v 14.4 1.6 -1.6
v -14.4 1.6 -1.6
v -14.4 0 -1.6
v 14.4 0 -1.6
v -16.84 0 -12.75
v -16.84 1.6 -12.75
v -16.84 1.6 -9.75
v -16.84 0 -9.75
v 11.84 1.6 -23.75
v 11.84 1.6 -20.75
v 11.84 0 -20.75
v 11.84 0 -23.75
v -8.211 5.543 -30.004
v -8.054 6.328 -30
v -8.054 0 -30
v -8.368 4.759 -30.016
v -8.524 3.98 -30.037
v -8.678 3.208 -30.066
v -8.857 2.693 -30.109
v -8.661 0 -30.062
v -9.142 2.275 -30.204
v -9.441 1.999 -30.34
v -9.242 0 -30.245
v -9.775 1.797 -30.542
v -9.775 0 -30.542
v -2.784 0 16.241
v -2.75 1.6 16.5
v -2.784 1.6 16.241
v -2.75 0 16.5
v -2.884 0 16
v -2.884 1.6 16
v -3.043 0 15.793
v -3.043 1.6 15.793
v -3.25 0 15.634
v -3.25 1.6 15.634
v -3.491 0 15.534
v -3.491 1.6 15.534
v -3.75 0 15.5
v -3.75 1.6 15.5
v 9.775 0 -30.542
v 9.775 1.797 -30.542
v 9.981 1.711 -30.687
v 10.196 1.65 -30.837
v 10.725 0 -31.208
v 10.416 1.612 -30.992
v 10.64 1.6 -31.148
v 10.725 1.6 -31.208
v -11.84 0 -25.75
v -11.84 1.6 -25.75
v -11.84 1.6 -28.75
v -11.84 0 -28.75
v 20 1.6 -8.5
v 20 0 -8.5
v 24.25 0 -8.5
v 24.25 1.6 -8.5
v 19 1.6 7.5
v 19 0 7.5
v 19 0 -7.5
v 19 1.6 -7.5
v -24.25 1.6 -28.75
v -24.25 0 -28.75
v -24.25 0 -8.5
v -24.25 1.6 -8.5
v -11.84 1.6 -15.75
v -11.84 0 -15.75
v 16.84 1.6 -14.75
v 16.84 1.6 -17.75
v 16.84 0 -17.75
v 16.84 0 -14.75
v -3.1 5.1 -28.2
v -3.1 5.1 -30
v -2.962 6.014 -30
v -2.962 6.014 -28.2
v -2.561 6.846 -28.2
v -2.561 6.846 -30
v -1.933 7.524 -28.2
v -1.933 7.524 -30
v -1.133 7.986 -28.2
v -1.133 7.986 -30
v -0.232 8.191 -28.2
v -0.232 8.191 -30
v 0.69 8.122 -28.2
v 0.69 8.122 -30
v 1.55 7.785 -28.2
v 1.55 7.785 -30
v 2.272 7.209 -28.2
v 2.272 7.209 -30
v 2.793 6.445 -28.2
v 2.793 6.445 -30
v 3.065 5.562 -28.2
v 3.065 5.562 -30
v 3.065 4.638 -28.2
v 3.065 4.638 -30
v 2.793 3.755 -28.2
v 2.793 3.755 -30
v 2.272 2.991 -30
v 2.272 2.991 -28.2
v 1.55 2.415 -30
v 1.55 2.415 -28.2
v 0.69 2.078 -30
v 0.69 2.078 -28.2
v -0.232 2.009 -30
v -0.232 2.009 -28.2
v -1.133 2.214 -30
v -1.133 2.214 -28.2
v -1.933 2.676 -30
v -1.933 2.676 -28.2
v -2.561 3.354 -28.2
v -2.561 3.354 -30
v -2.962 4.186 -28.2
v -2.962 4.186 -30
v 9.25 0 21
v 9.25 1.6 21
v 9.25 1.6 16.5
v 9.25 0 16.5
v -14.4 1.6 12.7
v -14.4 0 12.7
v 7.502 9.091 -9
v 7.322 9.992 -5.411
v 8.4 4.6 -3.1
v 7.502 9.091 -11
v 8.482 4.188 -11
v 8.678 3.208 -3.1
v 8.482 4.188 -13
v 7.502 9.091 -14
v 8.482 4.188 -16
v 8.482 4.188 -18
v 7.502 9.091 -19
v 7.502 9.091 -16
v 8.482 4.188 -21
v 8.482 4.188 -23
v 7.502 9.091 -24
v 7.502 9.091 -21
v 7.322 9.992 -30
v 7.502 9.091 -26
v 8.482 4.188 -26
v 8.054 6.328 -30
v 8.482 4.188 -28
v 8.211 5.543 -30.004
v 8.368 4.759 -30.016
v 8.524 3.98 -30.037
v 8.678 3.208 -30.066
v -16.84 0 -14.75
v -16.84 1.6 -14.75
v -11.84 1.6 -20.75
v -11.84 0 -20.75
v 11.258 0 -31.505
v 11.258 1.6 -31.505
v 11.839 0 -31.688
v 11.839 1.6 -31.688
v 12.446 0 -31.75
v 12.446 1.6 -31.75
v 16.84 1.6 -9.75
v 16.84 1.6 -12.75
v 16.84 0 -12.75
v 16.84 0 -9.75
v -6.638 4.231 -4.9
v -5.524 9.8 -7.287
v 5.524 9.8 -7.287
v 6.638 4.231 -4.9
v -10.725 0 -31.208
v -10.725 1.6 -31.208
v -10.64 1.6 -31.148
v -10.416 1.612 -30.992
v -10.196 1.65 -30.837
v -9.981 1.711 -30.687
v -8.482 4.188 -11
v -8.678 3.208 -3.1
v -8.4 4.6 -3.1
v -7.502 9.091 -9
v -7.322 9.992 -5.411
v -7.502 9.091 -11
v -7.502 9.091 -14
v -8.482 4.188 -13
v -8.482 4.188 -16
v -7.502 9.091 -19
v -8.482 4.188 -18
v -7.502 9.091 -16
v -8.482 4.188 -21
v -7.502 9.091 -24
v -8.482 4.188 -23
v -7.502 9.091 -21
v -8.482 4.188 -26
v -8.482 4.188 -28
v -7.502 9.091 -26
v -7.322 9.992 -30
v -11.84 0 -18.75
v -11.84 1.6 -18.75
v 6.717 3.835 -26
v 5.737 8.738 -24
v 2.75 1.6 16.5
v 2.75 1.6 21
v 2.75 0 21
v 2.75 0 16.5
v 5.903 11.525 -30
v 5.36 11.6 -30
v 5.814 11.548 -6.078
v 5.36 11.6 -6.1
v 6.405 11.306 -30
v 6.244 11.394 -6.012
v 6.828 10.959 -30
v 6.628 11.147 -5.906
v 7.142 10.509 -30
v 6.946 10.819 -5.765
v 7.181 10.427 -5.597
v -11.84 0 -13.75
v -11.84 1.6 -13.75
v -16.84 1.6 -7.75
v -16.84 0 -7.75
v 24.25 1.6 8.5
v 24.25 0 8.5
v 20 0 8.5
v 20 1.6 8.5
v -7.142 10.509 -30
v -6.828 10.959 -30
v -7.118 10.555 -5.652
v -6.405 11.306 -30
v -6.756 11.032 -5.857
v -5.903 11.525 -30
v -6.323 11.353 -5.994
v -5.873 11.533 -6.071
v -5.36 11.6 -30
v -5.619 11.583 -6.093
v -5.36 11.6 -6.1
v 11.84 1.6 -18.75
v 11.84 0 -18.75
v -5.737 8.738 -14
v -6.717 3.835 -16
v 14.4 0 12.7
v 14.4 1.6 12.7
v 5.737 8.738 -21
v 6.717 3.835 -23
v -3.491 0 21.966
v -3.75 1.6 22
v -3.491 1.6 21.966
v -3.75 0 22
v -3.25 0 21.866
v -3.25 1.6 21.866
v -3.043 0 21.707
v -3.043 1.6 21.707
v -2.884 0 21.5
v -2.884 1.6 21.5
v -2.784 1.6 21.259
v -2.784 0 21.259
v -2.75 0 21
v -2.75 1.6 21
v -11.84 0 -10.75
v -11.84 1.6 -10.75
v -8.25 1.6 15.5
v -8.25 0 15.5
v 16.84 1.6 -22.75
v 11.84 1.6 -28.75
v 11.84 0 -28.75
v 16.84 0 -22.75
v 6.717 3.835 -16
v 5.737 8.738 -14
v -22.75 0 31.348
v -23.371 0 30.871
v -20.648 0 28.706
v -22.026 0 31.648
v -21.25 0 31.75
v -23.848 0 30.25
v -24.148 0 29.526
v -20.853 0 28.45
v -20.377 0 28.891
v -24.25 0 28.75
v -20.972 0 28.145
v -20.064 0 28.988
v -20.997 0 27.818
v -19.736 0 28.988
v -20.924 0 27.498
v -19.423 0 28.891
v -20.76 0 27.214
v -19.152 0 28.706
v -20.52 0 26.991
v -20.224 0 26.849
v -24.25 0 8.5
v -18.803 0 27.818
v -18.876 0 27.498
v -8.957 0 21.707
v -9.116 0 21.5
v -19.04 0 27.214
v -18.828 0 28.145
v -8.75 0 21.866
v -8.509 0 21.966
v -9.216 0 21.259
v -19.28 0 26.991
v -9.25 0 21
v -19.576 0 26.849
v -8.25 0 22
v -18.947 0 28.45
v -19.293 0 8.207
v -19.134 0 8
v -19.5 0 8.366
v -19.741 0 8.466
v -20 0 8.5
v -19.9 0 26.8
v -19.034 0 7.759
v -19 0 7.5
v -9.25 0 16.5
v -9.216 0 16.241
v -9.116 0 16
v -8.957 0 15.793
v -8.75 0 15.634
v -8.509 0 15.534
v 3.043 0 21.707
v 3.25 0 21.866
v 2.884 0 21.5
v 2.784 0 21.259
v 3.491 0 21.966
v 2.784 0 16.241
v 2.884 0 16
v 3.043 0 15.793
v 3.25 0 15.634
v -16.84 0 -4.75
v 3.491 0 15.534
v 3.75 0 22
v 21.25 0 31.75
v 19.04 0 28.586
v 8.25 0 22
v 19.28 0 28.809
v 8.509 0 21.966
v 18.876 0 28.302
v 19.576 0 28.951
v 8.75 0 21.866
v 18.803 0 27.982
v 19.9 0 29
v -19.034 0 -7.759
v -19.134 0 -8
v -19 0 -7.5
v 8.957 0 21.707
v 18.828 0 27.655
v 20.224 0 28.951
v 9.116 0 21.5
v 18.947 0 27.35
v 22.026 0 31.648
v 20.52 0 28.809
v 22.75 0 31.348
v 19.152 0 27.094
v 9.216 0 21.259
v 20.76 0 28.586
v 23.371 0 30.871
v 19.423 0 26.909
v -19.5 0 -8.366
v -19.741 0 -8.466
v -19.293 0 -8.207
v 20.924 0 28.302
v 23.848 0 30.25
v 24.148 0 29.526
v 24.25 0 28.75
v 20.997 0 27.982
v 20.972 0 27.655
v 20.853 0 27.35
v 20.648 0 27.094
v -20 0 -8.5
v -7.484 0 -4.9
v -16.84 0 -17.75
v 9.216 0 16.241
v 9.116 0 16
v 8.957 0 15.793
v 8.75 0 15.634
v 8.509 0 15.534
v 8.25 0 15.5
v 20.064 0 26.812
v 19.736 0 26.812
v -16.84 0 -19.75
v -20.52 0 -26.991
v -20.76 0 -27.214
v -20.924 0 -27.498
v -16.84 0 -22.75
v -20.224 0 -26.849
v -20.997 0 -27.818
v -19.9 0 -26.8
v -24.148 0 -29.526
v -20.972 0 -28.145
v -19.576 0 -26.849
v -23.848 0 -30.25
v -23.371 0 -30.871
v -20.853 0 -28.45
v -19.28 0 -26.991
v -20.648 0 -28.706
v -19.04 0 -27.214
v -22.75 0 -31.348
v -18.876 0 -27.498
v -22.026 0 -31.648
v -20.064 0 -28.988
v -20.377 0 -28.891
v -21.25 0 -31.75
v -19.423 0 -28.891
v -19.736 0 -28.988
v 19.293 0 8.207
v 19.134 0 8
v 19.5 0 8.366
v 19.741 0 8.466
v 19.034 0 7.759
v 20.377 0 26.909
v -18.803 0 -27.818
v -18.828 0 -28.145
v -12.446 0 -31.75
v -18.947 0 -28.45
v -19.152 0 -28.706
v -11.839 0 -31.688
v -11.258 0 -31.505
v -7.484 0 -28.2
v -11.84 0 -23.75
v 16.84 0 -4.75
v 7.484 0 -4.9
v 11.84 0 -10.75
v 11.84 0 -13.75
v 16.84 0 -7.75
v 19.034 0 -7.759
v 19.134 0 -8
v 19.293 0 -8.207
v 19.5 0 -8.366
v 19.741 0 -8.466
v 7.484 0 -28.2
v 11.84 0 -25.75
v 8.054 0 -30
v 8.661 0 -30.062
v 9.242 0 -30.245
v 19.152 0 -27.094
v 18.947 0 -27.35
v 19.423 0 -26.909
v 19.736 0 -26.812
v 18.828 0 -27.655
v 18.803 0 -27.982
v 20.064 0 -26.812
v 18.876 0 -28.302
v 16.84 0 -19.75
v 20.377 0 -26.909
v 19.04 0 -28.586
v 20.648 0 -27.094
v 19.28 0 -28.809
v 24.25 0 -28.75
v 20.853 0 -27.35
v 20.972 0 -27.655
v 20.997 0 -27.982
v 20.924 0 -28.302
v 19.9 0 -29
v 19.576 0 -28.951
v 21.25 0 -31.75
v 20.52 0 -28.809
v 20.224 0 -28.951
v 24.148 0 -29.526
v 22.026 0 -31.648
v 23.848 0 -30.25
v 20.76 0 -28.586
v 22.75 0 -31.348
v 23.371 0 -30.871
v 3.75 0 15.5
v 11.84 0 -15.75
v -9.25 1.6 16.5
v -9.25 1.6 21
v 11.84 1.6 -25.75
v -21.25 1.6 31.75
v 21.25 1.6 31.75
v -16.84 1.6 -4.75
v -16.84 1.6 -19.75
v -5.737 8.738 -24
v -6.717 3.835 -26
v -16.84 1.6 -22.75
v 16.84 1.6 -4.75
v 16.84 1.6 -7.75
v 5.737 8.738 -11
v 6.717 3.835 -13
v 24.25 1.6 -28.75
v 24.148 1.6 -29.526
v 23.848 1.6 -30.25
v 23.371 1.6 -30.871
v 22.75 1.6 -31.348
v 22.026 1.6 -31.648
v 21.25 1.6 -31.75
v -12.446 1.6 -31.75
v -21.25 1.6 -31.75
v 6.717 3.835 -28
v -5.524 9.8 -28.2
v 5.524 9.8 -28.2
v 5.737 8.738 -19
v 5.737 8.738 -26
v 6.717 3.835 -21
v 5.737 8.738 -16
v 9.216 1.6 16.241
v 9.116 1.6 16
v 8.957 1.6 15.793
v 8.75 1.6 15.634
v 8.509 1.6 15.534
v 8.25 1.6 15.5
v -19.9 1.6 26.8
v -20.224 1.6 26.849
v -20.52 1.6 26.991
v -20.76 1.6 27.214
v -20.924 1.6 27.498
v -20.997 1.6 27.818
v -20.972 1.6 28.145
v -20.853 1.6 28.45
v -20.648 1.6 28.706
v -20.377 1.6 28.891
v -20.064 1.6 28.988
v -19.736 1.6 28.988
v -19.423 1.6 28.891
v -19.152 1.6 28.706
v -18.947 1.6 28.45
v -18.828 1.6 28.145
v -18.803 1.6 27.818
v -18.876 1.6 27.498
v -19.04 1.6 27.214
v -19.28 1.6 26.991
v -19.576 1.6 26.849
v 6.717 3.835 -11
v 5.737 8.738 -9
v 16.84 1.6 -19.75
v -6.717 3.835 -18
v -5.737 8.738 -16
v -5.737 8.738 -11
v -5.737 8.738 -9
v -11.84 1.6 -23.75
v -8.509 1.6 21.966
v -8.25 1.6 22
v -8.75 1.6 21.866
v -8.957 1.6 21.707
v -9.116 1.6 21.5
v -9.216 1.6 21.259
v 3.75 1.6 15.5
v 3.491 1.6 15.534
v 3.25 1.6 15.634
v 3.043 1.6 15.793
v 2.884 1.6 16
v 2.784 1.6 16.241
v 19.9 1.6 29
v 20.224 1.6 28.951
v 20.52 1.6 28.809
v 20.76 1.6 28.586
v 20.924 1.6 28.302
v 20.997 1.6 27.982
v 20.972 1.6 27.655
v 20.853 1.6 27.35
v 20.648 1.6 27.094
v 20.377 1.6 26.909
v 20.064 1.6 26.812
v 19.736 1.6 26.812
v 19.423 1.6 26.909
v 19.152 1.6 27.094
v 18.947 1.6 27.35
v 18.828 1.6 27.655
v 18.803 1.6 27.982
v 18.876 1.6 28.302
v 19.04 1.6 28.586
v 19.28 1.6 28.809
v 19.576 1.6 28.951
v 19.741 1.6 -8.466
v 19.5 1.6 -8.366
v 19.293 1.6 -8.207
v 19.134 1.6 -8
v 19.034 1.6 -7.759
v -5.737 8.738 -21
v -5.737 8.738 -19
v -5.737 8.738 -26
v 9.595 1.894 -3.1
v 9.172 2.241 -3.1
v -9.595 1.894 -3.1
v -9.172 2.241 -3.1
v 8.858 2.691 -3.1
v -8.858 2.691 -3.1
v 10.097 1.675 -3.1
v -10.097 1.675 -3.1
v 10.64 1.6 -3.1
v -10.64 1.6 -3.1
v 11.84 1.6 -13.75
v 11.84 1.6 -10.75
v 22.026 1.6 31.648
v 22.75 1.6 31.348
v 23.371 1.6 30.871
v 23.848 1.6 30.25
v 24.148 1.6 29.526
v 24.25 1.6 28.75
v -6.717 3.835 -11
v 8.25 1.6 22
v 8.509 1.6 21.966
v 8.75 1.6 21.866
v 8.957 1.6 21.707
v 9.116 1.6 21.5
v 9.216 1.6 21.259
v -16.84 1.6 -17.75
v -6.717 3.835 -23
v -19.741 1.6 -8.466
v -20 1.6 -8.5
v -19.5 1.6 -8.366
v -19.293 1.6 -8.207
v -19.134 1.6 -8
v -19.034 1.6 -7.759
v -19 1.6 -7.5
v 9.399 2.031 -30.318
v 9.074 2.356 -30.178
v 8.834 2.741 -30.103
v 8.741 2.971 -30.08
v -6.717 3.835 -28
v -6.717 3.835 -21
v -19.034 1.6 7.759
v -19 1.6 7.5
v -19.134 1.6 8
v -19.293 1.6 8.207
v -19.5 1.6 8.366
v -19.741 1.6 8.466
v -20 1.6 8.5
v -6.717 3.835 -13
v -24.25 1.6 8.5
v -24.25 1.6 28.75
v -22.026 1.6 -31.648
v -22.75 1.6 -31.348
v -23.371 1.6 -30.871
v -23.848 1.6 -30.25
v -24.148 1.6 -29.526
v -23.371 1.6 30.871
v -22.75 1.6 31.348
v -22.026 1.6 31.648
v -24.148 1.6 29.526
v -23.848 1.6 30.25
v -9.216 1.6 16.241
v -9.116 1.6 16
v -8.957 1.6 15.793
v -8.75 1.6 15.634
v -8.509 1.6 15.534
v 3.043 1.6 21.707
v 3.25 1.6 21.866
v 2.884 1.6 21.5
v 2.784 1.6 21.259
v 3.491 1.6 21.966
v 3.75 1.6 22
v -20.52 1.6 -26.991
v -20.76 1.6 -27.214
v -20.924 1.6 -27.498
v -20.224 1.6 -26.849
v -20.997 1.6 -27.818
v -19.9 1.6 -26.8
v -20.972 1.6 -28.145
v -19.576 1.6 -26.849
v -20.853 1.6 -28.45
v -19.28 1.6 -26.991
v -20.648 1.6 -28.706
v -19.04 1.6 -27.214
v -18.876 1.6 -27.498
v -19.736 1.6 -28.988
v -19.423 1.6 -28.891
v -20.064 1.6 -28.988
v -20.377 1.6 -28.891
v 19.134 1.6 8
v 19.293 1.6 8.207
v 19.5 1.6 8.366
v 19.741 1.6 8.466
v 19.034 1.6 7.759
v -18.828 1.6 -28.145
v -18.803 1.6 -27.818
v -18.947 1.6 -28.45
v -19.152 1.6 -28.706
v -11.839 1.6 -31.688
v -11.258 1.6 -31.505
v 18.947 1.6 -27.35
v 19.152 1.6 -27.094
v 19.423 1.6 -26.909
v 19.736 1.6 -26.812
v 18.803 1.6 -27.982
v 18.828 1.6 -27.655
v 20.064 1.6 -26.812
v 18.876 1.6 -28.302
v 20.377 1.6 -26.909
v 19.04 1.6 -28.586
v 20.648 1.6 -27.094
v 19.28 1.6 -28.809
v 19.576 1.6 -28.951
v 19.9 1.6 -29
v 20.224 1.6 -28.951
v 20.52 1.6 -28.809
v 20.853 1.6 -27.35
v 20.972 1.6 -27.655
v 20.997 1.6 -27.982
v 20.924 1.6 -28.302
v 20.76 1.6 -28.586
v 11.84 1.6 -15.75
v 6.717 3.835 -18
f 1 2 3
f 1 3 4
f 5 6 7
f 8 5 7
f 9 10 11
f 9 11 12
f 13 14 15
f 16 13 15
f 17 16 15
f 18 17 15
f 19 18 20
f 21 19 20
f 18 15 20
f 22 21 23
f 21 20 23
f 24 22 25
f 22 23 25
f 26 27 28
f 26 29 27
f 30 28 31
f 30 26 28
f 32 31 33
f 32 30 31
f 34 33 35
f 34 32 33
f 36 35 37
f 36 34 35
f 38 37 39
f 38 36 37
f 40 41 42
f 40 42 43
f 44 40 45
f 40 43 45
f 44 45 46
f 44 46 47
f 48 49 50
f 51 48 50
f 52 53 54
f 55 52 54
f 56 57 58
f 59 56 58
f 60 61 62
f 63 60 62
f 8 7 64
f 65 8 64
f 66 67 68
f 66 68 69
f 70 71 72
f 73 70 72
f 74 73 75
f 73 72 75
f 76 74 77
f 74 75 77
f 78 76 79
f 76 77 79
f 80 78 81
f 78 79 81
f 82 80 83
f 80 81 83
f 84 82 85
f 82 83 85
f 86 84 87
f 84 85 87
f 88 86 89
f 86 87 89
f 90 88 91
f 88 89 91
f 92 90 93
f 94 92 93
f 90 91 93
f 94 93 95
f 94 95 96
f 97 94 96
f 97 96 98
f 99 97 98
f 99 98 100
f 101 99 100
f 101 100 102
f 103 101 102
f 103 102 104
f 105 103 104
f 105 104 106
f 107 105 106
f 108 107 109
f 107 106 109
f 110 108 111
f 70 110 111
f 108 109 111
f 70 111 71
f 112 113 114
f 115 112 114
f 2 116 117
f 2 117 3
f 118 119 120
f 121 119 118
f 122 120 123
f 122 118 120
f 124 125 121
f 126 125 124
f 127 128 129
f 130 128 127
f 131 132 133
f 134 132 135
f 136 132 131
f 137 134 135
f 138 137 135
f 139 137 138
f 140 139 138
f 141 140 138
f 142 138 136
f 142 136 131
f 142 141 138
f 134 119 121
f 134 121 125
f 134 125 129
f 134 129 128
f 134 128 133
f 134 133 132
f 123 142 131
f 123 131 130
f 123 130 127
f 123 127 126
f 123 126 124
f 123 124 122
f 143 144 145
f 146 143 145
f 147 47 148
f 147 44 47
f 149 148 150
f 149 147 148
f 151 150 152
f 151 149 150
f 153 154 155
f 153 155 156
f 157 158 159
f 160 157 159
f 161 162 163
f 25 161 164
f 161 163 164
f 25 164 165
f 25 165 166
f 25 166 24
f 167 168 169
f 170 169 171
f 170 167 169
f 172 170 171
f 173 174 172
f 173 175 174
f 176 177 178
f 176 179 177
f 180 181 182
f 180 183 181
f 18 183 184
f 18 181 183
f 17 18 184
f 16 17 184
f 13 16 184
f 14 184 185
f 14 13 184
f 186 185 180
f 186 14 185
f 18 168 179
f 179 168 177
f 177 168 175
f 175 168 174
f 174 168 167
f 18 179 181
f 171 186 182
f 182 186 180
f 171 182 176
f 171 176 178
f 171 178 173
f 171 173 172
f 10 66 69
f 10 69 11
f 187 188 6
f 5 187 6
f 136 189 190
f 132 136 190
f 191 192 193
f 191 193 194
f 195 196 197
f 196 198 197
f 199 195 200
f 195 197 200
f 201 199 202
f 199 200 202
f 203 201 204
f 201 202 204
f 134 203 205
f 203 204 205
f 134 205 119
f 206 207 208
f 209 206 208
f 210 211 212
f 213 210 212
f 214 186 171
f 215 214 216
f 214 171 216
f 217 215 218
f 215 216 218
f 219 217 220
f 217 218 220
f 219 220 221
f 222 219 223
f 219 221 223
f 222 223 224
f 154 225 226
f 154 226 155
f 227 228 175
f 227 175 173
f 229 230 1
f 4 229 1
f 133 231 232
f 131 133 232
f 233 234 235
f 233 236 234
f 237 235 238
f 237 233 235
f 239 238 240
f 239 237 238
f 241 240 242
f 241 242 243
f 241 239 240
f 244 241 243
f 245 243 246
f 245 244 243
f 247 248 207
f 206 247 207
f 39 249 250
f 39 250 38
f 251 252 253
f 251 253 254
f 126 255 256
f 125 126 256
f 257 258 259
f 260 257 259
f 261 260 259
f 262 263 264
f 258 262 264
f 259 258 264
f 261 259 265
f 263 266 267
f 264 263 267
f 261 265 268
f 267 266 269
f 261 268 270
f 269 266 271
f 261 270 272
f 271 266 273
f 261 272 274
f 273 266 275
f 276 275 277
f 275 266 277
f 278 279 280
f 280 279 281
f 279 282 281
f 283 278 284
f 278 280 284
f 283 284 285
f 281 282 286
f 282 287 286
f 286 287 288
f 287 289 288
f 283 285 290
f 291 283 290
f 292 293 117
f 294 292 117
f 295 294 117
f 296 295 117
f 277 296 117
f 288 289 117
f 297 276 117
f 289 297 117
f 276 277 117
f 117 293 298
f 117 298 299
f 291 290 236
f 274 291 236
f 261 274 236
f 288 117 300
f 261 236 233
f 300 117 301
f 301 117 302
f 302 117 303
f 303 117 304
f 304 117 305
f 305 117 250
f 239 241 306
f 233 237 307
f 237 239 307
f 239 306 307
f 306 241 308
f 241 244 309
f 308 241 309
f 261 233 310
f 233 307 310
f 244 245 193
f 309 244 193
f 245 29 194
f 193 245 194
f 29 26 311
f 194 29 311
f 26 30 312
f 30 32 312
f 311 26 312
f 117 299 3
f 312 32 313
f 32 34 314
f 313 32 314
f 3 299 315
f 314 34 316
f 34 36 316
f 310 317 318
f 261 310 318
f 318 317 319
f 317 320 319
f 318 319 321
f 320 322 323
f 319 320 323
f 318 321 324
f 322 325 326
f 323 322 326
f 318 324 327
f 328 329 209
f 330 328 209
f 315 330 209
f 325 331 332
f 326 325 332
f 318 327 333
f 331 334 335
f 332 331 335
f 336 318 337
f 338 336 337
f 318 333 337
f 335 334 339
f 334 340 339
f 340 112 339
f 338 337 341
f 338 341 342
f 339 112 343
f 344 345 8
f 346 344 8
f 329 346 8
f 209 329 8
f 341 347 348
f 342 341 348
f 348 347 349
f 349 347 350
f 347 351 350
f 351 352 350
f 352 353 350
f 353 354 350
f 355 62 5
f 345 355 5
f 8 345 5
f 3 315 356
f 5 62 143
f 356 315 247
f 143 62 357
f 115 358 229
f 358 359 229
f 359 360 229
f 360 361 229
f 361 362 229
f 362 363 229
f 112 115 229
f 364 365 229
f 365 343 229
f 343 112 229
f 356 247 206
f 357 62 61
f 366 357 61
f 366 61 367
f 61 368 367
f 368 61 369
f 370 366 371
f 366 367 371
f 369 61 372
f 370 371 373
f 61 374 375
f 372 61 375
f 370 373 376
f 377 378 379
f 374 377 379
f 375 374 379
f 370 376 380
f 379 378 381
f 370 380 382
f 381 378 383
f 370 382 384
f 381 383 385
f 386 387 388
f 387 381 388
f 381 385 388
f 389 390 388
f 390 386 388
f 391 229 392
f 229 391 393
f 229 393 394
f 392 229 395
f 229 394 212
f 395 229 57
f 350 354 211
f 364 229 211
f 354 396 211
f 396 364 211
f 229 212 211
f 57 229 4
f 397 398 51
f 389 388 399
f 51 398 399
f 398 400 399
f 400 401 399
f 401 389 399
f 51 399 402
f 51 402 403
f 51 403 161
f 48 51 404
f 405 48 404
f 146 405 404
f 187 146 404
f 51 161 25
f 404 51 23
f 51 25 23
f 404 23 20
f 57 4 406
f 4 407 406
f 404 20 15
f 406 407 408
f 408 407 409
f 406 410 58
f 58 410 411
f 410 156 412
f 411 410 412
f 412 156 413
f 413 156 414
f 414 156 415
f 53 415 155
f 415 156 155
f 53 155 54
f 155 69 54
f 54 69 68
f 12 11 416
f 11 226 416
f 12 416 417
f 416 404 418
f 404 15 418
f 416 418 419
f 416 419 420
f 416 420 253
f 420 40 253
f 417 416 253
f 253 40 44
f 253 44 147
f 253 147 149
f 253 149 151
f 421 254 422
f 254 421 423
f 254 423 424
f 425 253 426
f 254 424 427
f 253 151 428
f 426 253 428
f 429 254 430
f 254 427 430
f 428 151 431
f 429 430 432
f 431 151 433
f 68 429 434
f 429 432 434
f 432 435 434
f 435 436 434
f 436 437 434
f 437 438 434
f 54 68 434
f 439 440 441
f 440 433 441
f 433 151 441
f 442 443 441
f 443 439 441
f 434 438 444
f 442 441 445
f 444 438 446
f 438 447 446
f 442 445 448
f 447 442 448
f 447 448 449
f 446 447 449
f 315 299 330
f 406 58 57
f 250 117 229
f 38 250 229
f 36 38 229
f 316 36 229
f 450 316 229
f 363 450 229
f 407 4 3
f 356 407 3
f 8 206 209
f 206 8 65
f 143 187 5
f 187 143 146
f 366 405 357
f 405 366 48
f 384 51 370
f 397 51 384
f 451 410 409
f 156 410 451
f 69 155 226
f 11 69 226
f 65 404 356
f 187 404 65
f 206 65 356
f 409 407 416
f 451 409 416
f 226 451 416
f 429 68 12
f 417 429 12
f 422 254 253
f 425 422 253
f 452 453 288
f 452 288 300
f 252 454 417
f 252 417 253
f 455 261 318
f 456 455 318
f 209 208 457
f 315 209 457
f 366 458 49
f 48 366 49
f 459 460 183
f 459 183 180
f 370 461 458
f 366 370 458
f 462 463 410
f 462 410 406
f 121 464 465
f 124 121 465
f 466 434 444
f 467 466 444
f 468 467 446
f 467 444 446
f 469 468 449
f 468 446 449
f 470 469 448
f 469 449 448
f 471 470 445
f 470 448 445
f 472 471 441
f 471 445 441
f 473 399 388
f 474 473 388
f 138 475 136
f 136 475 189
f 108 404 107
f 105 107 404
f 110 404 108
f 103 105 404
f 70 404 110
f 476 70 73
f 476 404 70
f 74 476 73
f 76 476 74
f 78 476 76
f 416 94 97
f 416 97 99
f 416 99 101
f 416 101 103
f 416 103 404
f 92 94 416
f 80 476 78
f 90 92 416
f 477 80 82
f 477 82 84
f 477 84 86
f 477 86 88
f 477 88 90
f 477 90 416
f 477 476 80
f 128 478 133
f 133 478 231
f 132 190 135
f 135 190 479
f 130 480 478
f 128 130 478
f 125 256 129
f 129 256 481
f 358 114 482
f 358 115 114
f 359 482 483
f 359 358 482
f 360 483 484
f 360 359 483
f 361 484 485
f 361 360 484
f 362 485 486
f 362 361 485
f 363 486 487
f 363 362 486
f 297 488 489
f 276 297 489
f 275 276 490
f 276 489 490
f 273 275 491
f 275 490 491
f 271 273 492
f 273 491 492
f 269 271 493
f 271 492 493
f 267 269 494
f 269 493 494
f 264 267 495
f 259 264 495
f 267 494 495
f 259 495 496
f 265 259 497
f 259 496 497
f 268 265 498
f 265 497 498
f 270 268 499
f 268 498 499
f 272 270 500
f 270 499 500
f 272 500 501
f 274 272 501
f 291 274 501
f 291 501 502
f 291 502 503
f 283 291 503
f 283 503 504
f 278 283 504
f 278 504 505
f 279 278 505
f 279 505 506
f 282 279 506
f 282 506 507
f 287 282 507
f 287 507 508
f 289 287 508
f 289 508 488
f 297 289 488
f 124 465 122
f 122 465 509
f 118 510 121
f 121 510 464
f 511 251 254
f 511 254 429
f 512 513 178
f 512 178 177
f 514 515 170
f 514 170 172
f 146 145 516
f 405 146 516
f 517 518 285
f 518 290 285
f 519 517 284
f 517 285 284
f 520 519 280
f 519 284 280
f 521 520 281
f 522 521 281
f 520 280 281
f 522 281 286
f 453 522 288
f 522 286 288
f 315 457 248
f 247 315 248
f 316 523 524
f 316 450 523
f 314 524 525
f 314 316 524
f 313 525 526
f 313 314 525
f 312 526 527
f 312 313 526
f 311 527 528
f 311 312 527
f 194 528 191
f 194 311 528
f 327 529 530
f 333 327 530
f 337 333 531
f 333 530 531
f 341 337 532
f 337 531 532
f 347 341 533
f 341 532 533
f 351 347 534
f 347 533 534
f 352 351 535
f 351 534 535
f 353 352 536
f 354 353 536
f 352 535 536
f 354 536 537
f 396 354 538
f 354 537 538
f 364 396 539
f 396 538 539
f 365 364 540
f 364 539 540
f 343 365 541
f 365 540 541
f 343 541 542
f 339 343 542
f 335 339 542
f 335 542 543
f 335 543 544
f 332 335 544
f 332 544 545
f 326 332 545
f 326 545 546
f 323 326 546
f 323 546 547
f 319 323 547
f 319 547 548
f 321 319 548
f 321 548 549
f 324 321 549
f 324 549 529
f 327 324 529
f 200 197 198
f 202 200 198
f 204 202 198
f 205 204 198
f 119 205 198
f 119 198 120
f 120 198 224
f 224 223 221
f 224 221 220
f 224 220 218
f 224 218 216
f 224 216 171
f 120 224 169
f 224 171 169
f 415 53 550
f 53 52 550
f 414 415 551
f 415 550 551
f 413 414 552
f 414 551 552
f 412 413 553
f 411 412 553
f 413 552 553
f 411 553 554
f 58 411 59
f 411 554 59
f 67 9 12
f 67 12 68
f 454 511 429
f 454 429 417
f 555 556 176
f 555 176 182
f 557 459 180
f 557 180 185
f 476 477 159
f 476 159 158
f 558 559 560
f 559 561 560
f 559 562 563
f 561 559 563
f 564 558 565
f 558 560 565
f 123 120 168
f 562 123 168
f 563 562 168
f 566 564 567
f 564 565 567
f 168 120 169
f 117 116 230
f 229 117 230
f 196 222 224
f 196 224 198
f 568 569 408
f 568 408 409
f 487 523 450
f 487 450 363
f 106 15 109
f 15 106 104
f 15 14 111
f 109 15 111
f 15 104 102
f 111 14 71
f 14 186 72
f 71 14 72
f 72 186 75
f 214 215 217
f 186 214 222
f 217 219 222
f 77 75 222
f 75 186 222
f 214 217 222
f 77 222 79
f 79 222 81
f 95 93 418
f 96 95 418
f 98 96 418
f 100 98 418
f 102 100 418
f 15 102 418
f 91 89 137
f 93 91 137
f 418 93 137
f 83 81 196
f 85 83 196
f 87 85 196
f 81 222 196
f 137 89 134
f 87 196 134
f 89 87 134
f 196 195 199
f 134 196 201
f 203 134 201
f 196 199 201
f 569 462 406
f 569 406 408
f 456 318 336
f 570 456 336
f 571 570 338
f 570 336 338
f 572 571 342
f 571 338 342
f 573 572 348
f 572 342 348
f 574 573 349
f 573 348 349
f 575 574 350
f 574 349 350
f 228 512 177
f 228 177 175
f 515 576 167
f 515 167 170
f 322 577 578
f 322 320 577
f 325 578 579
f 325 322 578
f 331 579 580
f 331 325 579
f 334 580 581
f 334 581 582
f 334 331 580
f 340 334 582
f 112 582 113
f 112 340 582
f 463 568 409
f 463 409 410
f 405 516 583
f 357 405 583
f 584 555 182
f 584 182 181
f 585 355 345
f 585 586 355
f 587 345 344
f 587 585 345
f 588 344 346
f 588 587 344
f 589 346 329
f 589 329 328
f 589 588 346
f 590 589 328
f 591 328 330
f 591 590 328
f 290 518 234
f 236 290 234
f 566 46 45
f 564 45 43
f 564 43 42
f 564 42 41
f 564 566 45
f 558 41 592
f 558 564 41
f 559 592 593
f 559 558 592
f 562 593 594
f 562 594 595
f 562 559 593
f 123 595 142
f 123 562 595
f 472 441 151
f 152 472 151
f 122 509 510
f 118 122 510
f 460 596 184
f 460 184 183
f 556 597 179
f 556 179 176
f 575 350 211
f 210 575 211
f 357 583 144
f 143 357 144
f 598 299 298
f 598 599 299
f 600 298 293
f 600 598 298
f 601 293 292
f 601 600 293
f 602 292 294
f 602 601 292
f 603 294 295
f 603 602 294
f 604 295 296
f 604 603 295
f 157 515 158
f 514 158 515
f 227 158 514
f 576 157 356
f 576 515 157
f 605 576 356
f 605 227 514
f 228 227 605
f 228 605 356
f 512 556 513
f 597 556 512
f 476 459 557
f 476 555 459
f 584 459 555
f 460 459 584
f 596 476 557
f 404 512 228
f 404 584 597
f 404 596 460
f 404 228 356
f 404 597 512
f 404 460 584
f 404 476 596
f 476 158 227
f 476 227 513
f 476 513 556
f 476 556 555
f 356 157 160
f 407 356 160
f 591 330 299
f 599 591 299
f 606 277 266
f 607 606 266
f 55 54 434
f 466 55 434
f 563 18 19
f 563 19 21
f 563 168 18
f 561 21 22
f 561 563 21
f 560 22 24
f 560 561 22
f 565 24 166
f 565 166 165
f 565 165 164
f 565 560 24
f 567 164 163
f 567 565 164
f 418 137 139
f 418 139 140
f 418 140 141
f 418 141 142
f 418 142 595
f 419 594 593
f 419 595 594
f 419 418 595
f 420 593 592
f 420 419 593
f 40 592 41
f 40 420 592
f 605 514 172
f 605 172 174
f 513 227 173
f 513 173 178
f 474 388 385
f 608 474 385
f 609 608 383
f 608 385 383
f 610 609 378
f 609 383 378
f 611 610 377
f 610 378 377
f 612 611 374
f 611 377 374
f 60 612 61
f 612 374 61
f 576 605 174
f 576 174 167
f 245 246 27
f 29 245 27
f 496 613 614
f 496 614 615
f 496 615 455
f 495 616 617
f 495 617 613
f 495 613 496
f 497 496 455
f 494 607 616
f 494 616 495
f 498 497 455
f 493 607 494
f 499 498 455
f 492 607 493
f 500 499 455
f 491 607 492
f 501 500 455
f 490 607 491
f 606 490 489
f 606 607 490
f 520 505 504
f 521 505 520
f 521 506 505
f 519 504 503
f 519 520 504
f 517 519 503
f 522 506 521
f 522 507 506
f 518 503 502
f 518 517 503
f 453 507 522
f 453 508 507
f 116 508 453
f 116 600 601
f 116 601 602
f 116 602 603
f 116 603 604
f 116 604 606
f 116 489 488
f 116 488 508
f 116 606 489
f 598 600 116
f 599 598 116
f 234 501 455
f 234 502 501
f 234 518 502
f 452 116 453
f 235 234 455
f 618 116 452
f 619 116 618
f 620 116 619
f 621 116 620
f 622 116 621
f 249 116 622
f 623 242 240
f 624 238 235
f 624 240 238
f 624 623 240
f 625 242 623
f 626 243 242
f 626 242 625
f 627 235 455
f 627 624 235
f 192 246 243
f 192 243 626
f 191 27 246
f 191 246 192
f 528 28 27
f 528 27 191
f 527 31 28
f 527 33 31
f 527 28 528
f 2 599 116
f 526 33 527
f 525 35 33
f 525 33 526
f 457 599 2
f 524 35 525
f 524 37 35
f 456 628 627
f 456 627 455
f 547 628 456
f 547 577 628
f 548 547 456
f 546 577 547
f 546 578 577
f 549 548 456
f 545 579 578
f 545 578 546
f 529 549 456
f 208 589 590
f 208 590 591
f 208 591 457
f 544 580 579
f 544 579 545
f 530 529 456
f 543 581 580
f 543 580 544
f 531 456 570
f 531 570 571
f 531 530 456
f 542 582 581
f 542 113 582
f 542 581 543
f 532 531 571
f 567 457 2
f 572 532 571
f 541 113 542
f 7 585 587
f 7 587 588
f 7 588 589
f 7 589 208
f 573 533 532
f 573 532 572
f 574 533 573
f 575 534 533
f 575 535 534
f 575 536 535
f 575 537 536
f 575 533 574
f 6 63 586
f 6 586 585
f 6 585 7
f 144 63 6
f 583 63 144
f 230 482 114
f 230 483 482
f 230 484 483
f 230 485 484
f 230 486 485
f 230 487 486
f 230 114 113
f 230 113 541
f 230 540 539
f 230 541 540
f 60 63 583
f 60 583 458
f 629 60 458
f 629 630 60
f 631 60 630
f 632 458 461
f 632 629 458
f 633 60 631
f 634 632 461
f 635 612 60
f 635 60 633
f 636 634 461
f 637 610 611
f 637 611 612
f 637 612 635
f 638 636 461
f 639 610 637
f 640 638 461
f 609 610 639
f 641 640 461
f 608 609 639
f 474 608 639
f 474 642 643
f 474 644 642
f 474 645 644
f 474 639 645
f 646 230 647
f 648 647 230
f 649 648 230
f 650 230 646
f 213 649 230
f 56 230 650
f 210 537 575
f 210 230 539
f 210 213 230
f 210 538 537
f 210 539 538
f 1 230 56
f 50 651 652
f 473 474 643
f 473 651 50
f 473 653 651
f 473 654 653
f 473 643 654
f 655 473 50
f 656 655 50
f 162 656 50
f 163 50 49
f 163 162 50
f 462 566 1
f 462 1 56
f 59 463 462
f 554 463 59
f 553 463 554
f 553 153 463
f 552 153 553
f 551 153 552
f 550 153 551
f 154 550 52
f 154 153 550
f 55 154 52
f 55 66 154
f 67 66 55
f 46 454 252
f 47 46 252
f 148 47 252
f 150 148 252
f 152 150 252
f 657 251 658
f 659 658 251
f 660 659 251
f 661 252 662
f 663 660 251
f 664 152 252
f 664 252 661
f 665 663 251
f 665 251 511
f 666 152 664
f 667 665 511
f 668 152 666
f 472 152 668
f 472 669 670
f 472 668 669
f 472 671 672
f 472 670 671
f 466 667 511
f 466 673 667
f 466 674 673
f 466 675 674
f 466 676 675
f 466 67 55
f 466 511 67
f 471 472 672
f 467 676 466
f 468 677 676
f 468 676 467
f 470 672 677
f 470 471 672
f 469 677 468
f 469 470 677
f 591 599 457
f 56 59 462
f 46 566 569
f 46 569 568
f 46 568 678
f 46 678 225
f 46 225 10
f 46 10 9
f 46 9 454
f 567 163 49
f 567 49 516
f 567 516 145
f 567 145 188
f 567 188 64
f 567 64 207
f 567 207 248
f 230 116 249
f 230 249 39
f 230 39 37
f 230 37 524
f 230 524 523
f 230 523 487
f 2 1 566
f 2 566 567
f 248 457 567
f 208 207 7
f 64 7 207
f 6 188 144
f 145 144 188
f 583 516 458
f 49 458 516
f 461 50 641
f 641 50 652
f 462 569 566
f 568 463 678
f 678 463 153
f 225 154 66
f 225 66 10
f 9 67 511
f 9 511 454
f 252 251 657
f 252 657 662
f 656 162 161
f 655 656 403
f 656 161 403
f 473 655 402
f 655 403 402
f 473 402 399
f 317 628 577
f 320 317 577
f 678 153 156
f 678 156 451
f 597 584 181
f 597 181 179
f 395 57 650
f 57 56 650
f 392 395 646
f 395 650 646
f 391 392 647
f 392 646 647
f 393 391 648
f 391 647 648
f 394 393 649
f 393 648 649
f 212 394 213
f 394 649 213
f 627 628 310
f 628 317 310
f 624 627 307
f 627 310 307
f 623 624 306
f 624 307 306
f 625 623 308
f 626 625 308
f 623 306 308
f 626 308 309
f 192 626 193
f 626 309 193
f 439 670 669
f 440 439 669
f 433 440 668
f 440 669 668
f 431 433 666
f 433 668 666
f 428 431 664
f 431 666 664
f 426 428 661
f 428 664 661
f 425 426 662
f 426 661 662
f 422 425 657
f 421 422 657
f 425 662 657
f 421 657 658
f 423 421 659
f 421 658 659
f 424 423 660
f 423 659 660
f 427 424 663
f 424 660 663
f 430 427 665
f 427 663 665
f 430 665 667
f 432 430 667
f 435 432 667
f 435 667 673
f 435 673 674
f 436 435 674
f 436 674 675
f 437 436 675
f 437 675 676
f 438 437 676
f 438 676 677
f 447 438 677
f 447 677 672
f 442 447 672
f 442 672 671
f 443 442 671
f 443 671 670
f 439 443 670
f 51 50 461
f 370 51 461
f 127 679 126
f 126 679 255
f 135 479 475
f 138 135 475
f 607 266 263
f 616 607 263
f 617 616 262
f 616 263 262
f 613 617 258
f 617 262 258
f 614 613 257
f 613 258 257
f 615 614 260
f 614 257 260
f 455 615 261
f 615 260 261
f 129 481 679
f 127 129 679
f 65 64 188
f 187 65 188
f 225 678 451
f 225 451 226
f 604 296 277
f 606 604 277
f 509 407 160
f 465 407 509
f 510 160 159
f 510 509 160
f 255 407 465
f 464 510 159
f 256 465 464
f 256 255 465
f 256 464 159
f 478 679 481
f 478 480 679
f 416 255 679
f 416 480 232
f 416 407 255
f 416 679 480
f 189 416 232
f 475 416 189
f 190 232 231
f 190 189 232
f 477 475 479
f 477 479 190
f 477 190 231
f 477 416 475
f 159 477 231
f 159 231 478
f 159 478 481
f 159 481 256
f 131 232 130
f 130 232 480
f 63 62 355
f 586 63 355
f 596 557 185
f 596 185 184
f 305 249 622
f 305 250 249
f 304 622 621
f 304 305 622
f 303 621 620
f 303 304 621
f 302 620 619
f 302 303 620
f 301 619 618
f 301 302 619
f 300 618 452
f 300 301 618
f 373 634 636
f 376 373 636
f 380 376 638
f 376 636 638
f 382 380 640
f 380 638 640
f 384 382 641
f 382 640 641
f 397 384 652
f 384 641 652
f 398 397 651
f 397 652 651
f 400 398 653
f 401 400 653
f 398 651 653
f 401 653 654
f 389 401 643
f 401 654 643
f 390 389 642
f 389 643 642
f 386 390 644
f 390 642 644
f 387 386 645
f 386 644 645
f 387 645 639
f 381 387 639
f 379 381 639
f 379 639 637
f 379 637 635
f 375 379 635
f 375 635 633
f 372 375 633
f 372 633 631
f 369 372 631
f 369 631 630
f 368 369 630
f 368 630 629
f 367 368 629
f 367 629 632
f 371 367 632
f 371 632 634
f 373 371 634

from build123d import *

# Parameters (mm, degrees)
EXTRUDE_1_DEPTH          = 1.6
SKETCH_2_R               = 1.1
CUT_EXTRUDE_1_DEPTH      = 40.983559121
FILLET_1_R               = 1
SKETCH_4_W               = 6.5
SKETCH_4_H               = 6.5
CUT_EXTRUDE_2_DEPTH      = 40.983559121
FILLET_2_R               = 1
SKETCH_8_W               = 28.8
SKETCH_8_H               = 14.3
CUT_EXTRUDE_3_DEPTH      = 1.6
EXTRUDE_START            = -1.75
EXTRUDE_2_DEPTH          = 26.9
CUT_EXTRUDE_4_DEPTH      = 42.601502377
CUT_EXTRUDE_4_DEPTH_BACK = 42.601502377
CUT_EXTRUDE_6_DEPTH      = 42.18403817
SHELL_START              = -28.2
SHELL_3_DEPTH            = 23.3
SHELL_START_2            = -2.83732082
SHELL_3_2_DEPTH          = 1.8
FILLET_3_R               = 3
SKETCH_15_R              = 3.1
CUT_EXTRUDE_8_DEPTH      = 1.8
FILLET_5_R               = 2
CUT_EXTRUDE_9_DEPTH      = 42.18403817
CUT_EXTRUDE_START        = -1.8
CUT_EXTRUDE_10_DEPTH     = 1.8


with BuildPart() as part:
    # 草图1 → 凸台-拉伸1 (new body)
    with BuildSketch(Plane(origin=(0, 0, 0), x_dir=(1, 0, 0), z_dir=(0, 1, 0))):
        with BuildLine():
            Line((-24.25, 8.5), (-19, 8.5))
            Line((-19, 8.5), (-19, -8.5))
            Line((-19, -8.5), (-24.25, -8.5))
            Line((-24.25, -8.5), (-24.25, -28.75))
            ThreePointArc((-24.25, -28.75), (-23.371320344, -30.871320344), (-21.25, -31.75))
            Line((-21.25, -31.75), (21.25, -31.75))
            ThreePointArc((21.25, -31.75), (23.371320344, -30.871320344), (24.25, -28.75))
            Line((24.25, -28.75), (24.25, -8.5))
            Line((24.25, -8.5), (19, -8.5))
            Line((19, -8.5), (19, 8.5))
            Line((19, 8.5), (24.25, 8.5))
            Line((24.25, 8.5), (24.25, 28.75))
            ThreePointArc((24.25, 28.75), (23.371320344, 30.871320344), (21.25, 31.75))
            Line((21.25, 31.75), (-21.25, 31.75))
            ThreePointArc((-21.25, 31.75), (-23.371320344, 30.871320344), (-24.25, 28.75))
            Line((-24.25, 28.75), (-24.25, 8.5))
        make_face()
    extrude(amount=EXTRUDE_1_DEPTH)

    # 草图2 → 切除-拉伸1 (cut, through all)
    with BuildSketch(Plane(origin=(0, 1.6, 0), x_dir=(1, 0, 0), z_dir=(0, 1, 0))):
        with Locations(Location((-19.9, 27.9, 0), (0, 0, 270))):
            Circle(SKETCH_2_R)
        with Locations(Location((19.9, 27.9, 0), (0, 0, 90))):
            Circle(SKETCH_2_R)
        with Locations(Location((19.9, -27.9, 0), (0, 0, 270))):
            Circle(SKETCH_2_R)
        with Locations(Location((-19.9, -27.9, 0), (0, 0, 90))):
            Circle(SKETCH_2_R)
    extrude(amount=-CUT_EXTRUDE_1_DEPTH, mode=Mode.SUBTRACT)

    # 圆角1
    fillet_1_edges = [part.edges().sort_by_distance(p)[0] for p in [
        (19, 0.8, -8.5),
        (19, 0.8, 8.5),
        (-19, 0.8, 8.5),
        (-19, 0.8, -8.5),
    ]]
    fillet(fillet_1_edges, radius=FILLET_1_R)

    # 草图4 → 切除-拉伸2 (cut, through all)
    with BuildSketch(Plane(origin=(0, 1.6, 0), x_dir=(1, 0, 0), z_dir=(0, 1, 0))):
        with Locations((-6, -18.75)):
            Rectangle(SKETCH_4_W, SKETCH_4_H)
        with Locations((6, -18.75)):
            Rectangle(SKETCH_4_W, SKETCH_4_H)
    extrude(amount=-CUT_EXTRUDE_2_DEPTH, mode=Mode.SUBTRACT)

    # 圆角2
    fillet_2_edges = [part.edges().sort_by_distance(p)[0] for p in [
        (-2.75, 0.8, 15.5),
        (-2.75, 0.8, 22),
        (9.25, 0.8, 15.5),
        (9.25, 0.8, 22),
        (2.75, 0.8, 22),
        (2.75, 0.8, 15.5),
        (-9.25, 0.8, 22),
        (-9.25, 0.8, 15.5),
    ]]
    fillet(fillet_2_edges, radius=FILLET_2_R)

    # 草图8 → 切除-拉伸3 (cut)
    with BuildSketch(Plane(origin=(0, 1.6, 0), x_dir=(1, 0, 0), z_dir=(0, 1, 0))):
        with Locations((0, -5.55)):
            Rectangle(SKETCH_8_W, SKETCH_8_H)
    extrude(amount=-CUT_EXTRUDE_3_DEPTH, mode=Mode.SUBTRACT)

    # 草图10 → 凸台-拉伸2 (add)
    with BuildSketch(Plane(origin=(0, 0, -31.75), x_dir=(-1, 0, 0), z_dir=(0, 0, -1)).offset(EXTRUDE_START)):
        Polygon((-9, 1.6), (9, 1.6), (7, 11.6), (-7, 11.6), align=None)
    extrude(amount=-EXTRUDE_2_DEPTH)

    # 草图11 → 切除-拉伸4 (cut, two sides: drawn at the far end of the back side and taken through both)
    with BuildSketch(Plane(origin=(0, 0, 0), x_dir=(0, 0, -1), z_dir=(1, 0, 0)).offset(-CUT_EXTRUDE_4_DEPTH_BACK)):
        Polygon((6.1, 11.6), (3.1, 4.6), (3.1, 11.6), align=None)
    extrude(amount=CUT_EXTRUDE_4_DEPTH + CUT_EXTRUDE_4_DEPTH_BACK, mode=Mode.SUBTRACT)

    # 草图14 → 切除-拉伸6 (cut, through all)
    with BuildSketch(Plane(origin=(0, 1.6, 0), x_dir=(1, 0, 0), z_dir=(0, 1, 0))):
        Polygon((-9, 30), (9, 30), (11.5, 31.75), (-11.5, 31.75), align=None)
    extrude(amount=-CUT_EXTRUDE_6_DEPTH, mode=Mode.SUBTRACT)

    # 抽壳3: read off the stored shape, not the designer's step
    # 抽壳3 outline → 抽壳3 (cut)
    with BuildSketch(Plane.XY.offset(SHELL_START)):
        Polygon((-7.484352975, 0), (7.484352975, 0), (5.524352975, 9.8), (-5.524352975, 9.8), align=None)
    extrude(amount=SHELL_3_DEPTH, mode=Mode.SUBTRACT)

    # Shell 3 2 outline → Shell 3 2 (add)
    with BuildSketch(Plane(origin=(0, 0, 0), x_dir=(1, 0, 0), z_dir=(0, 0.3939192985791679, 0.9191450300180578)).offset(SHELL_START_2)):
        Polygon((6.638245748, 5.818680827), (5.524352975, 11.878076985), (-5.524352975, 11.878076985), (-6.638245748, 5.818680827), align=None)
    extrude(amount=SHELL_3_2_DEPTH)

    # 圆角3
    fillet_3_edges = [part.edges().sort_by_distance(p)[0] for p in [
        (-11.5, 0.8, -31.75),
        (11.5, 0.8, -31.75),
        (9, 0.8, -30),
        (-9, 0.8, -30),
    ]]
    fillet(fillet_3_edges, radius=FILLET_3_R)

    # 草图15 → 切除-拉伸8 (cut)
    with BuildSketch(Plane(origin=(0, 0, -30), x_dir=(-1, 0, 0), z_dir=(0, 0, -1))):
        with Locations((0, 5.1)):
            Circle(SKETCH_15_R)
    extrude(amount=-CUT_EXTRUDE_8_DEPTH, mode=Mode.SUBTRACT)

    # 圆角5
    fillet_5_edges = [part.edges().sort_by_distance(p)[0] for p in [
        (9, 1.6, -16.626473173),
        (-9, 1.6, -16.626473173),
        (7, 11.6, -18.05),
        (-7, 11.6, -18.05),
    ]]
    fillet(fillet_5_edges, radius=FILLET_5_R)

    # 草图16 → 切除-拉伸9 (cut, through all)
    with BuildSketch(Plane(origin=(0, 1.6, 0), x_dir=(1, 0, 0), z_dir=(0, 1, 0))):
        Polygon((-11.839607805, 25.75), (-11.839607805, 28.75), (-16.839607805, 22.75), (-16.839607805, 19.75), align=None)
        Polygon((-11.839607805, 20.75), (-11.839607805, 23.75), (-16.839607805, 17.75), (-16.839607805, 14.75), align=None)
        Polygon((-11.839607805, 15.75), (-11.839607805, 18.75), (-16.839607805, 12.75), (-16.839607805, 9.75), align=None)
        Polygon((-11.839607805, 10.75), (-11.839607805, 13.75), (-16.839607805, 7.75), (-16.839607805, 4.75), align=None)
    cut_extrude_9 = extrude(amount=-CUT_EXTRUDE_9_DEPTH, mode=Mode.SUBTRACT)

    # 镜向1: 切除-拉伸9 across plane
    add(cut_extrude_9.mirror(Plane(origin=(0, 0, 0), x_dir=(0, 0, 1), z_dir=(1, 0, 0))), mode=Mode.SUBTRACT)

    # 草图18 → 切除-拉伸10 (cut)
    with BuildSketch(Plane(origin=(-8.961538462, 1.792307692, 0), x_dir=(0, 0, 1), z_dir=(-0.9805806756909202, 0.19611613513818404, 0)).offset(CUT_EXTRUDE_START)):
        Polygon((-28, 2.44349167), (-26, 2.44349167), (-24, 7.44349167), (-26, 7.44349167), align=None)
        Polygon((-23, 2.44349167), (-21, 2.44349167), (-19, 7.44349167), (-21, 7.44349167), align=None)
        Polygon((-18, 2.44349167), (-16, 2.44349167), (-14, 7.44349167), (-16, 7.44349167), align=None)
        Polygon((-13, 2.44349167), (-11, 2.44349167), (-9, 7.44349167), (-11, 7.44349167), align=None)
    cut_extrude_10 = extrude(amount=CUT_EXTRUDE_10_DEPTH, mode=Mode.SUBTRACT)

    # 镜向2: 切除-拉伸10 across plane
    add(cut_extrude_10.mirror(Plane(origin=(0, 0, 0), x_dir=(0, 0, 1), z_dir=(1, 0, 0))), mode=Mode.SUBTRACT)


solid = part.part
